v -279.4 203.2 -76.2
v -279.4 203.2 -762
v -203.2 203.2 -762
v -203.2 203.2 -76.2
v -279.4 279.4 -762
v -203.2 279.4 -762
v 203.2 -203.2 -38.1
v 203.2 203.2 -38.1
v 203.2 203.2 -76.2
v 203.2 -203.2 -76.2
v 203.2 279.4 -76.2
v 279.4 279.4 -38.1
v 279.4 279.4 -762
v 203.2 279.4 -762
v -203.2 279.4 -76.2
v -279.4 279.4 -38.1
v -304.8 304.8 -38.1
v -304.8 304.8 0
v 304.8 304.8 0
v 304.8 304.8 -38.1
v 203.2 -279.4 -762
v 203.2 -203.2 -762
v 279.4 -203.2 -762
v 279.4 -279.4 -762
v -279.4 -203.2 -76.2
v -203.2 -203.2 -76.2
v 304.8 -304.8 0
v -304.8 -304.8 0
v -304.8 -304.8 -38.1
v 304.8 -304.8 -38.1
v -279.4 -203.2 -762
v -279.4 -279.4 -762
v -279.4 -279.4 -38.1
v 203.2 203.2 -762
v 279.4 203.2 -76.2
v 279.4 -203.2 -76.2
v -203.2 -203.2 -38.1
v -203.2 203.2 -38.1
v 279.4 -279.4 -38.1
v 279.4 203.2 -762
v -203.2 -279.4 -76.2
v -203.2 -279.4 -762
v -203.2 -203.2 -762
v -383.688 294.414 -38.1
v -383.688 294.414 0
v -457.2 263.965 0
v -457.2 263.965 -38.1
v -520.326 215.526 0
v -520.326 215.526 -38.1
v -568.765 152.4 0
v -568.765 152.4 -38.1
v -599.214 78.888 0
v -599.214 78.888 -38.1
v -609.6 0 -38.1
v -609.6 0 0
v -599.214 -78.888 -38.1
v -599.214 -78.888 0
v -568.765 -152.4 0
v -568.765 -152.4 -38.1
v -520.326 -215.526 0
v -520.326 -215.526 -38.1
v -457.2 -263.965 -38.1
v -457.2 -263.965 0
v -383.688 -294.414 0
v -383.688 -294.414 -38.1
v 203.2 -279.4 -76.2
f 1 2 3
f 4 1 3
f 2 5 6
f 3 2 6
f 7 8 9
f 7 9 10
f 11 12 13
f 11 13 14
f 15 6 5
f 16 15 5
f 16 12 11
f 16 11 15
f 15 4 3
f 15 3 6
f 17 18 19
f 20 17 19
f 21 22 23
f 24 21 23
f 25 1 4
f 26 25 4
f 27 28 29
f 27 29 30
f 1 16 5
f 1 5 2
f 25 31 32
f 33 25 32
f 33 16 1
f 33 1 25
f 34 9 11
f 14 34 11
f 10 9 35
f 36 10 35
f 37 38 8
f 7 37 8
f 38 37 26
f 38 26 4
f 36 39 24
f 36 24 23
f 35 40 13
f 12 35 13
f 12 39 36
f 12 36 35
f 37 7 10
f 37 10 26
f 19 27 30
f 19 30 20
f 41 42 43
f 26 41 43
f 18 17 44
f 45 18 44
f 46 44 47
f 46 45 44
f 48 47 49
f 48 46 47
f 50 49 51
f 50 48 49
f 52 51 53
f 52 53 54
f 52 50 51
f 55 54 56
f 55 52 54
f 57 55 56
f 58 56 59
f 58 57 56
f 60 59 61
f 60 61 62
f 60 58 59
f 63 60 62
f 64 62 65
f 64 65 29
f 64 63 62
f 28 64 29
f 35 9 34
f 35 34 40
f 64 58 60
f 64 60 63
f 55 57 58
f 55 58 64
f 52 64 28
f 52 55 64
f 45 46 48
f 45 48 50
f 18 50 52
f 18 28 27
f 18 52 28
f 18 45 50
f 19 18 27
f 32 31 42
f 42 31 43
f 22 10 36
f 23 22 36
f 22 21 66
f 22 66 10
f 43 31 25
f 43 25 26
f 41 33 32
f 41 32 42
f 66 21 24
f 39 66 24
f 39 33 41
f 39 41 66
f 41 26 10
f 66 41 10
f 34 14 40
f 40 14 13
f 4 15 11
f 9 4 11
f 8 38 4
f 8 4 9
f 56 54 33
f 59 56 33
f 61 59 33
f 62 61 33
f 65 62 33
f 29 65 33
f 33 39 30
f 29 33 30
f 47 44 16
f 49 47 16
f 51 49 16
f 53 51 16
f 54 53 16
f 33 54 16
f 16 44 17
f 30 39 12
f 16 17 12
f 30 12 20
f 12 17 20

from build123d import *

# Parameters (mm, degrees)
F0_W     = 609.6
F0_H     = 609.6
F0_W_2   = 76.2
F0_H_2   = 76.2
F0_W_3   = 406.4
F0_H_3   = 406.4
F1_DEPTH = 38.1
F2_DEPTH = 76.2
F3_DEPTH = 762
F6_DEPTH = 38.1


with BuildPart() as f1:
    # F0 (on Top) → F1 (new body)
    with BuildSketch(Plane.XY):
        Rectangle(F0_W, F0_H)
        Polygon((203.2, 279.4), (279.4, 279.4), (279.4, 203.2), (279.4, -203.2), (279.4, -279.4), (203.2, -279.4), (-203.2, -279.4), (-279.4, -279.4), (-279.4, -203.2), (-279.4, 203.2), (-279.4, 279.4), (-203.2, 279.4), align=None, mode=Mode.SUBTRACT)
        with Locations((-241.3, 241.3)):
            Rectangle(F0_W_2, F0_H_2)
        with Locations((0, 241.3)):
            Rectangle(F0_W_3, F0_H_2)
        with Locations((241.3, 241.3)):
            Rectangle(F0_W_2, F0_H_2)
        with Locations((241.3, 0)):
            Rectangle(F0_W_2, F0_H_3)
        with Locations((241.3, -241.3)):
            Rectangle(F0_W_2, F0_H_2)
        with Locations((0, -241.3)):
            Rectangle(F0_W_3, F0_H_2)
        with Locations((-241.3, -241.3)):
            Rectangle(F0_W_2, F0_H_2)
        with Locations((-241.3, 0)):
            Rectangle(F0_W_2, F0_H_3)
        Rectangle(F0_W_3, F0_H_3)
    extrude(amount=-F1_DEPTH)

    # F0 (on Top) → F2 (join)
    with BuildSketch(Plane.XY):
        with Locations((-241.3, -241.3)):
            Rectangle(F0_W_2, F0_H_2)
        with Locations((-241.3, 0)):
            Rectangle(F0_W_2, F0_H_3)
        with Locations((0, -241.3)):
            Rectangle(F0_W_3, F0_H_2)
        with Locations((241.3, -241.3)):
            Rectangle(F0_W_2, F0_H_2)
        with Locations((241.3, 0)):
            Rectangle(F0_W_2, F0_H_3)
        with Locations((241.3, 241.3)):
            Rectangle(F0_W_2, F0_H_2)
        with Locations((0, 241.3)):
            Rectangle(F0_W_3, F0_H_2)
        with Locations((-241.3, 241.3)):
            Rectangle(F0_W_2, F0_H_2)
    extrude(amount=-F2_DEPTH)

    # F0 (on Top) → F3 (join)
    with BuildSketch(Plane.XY):
        with Locations((-241.3, 241.3)):
            Rectangle(F0_W_2, F0_H_2)
        with Locations((-241.3, -241.3)):
            Rectangle(F0_W_2, F0_H_2)
        with Locations((241.3, -241.3)):
            Rectangle(F0_W_2, F0_H_2)
        with Locations((241.3, 241.3)):
            Rectangle(F0_W_2, F0_H_2)
    extrude(amount=-F3_DEPTH)

    # F5 (on face) → F6 (join)
    with BuildSketch(Plane.XY):
        with BuildLine():
            ThreePointArc((-304.8, 304.8), (-609.6, 0), (-304.8, -304.8))
            Line((-304.8, -304.8), (-304.8, 304.8))
        make_face()
    extrude(amount=-F6_DEPTH)


solid = f1.part
